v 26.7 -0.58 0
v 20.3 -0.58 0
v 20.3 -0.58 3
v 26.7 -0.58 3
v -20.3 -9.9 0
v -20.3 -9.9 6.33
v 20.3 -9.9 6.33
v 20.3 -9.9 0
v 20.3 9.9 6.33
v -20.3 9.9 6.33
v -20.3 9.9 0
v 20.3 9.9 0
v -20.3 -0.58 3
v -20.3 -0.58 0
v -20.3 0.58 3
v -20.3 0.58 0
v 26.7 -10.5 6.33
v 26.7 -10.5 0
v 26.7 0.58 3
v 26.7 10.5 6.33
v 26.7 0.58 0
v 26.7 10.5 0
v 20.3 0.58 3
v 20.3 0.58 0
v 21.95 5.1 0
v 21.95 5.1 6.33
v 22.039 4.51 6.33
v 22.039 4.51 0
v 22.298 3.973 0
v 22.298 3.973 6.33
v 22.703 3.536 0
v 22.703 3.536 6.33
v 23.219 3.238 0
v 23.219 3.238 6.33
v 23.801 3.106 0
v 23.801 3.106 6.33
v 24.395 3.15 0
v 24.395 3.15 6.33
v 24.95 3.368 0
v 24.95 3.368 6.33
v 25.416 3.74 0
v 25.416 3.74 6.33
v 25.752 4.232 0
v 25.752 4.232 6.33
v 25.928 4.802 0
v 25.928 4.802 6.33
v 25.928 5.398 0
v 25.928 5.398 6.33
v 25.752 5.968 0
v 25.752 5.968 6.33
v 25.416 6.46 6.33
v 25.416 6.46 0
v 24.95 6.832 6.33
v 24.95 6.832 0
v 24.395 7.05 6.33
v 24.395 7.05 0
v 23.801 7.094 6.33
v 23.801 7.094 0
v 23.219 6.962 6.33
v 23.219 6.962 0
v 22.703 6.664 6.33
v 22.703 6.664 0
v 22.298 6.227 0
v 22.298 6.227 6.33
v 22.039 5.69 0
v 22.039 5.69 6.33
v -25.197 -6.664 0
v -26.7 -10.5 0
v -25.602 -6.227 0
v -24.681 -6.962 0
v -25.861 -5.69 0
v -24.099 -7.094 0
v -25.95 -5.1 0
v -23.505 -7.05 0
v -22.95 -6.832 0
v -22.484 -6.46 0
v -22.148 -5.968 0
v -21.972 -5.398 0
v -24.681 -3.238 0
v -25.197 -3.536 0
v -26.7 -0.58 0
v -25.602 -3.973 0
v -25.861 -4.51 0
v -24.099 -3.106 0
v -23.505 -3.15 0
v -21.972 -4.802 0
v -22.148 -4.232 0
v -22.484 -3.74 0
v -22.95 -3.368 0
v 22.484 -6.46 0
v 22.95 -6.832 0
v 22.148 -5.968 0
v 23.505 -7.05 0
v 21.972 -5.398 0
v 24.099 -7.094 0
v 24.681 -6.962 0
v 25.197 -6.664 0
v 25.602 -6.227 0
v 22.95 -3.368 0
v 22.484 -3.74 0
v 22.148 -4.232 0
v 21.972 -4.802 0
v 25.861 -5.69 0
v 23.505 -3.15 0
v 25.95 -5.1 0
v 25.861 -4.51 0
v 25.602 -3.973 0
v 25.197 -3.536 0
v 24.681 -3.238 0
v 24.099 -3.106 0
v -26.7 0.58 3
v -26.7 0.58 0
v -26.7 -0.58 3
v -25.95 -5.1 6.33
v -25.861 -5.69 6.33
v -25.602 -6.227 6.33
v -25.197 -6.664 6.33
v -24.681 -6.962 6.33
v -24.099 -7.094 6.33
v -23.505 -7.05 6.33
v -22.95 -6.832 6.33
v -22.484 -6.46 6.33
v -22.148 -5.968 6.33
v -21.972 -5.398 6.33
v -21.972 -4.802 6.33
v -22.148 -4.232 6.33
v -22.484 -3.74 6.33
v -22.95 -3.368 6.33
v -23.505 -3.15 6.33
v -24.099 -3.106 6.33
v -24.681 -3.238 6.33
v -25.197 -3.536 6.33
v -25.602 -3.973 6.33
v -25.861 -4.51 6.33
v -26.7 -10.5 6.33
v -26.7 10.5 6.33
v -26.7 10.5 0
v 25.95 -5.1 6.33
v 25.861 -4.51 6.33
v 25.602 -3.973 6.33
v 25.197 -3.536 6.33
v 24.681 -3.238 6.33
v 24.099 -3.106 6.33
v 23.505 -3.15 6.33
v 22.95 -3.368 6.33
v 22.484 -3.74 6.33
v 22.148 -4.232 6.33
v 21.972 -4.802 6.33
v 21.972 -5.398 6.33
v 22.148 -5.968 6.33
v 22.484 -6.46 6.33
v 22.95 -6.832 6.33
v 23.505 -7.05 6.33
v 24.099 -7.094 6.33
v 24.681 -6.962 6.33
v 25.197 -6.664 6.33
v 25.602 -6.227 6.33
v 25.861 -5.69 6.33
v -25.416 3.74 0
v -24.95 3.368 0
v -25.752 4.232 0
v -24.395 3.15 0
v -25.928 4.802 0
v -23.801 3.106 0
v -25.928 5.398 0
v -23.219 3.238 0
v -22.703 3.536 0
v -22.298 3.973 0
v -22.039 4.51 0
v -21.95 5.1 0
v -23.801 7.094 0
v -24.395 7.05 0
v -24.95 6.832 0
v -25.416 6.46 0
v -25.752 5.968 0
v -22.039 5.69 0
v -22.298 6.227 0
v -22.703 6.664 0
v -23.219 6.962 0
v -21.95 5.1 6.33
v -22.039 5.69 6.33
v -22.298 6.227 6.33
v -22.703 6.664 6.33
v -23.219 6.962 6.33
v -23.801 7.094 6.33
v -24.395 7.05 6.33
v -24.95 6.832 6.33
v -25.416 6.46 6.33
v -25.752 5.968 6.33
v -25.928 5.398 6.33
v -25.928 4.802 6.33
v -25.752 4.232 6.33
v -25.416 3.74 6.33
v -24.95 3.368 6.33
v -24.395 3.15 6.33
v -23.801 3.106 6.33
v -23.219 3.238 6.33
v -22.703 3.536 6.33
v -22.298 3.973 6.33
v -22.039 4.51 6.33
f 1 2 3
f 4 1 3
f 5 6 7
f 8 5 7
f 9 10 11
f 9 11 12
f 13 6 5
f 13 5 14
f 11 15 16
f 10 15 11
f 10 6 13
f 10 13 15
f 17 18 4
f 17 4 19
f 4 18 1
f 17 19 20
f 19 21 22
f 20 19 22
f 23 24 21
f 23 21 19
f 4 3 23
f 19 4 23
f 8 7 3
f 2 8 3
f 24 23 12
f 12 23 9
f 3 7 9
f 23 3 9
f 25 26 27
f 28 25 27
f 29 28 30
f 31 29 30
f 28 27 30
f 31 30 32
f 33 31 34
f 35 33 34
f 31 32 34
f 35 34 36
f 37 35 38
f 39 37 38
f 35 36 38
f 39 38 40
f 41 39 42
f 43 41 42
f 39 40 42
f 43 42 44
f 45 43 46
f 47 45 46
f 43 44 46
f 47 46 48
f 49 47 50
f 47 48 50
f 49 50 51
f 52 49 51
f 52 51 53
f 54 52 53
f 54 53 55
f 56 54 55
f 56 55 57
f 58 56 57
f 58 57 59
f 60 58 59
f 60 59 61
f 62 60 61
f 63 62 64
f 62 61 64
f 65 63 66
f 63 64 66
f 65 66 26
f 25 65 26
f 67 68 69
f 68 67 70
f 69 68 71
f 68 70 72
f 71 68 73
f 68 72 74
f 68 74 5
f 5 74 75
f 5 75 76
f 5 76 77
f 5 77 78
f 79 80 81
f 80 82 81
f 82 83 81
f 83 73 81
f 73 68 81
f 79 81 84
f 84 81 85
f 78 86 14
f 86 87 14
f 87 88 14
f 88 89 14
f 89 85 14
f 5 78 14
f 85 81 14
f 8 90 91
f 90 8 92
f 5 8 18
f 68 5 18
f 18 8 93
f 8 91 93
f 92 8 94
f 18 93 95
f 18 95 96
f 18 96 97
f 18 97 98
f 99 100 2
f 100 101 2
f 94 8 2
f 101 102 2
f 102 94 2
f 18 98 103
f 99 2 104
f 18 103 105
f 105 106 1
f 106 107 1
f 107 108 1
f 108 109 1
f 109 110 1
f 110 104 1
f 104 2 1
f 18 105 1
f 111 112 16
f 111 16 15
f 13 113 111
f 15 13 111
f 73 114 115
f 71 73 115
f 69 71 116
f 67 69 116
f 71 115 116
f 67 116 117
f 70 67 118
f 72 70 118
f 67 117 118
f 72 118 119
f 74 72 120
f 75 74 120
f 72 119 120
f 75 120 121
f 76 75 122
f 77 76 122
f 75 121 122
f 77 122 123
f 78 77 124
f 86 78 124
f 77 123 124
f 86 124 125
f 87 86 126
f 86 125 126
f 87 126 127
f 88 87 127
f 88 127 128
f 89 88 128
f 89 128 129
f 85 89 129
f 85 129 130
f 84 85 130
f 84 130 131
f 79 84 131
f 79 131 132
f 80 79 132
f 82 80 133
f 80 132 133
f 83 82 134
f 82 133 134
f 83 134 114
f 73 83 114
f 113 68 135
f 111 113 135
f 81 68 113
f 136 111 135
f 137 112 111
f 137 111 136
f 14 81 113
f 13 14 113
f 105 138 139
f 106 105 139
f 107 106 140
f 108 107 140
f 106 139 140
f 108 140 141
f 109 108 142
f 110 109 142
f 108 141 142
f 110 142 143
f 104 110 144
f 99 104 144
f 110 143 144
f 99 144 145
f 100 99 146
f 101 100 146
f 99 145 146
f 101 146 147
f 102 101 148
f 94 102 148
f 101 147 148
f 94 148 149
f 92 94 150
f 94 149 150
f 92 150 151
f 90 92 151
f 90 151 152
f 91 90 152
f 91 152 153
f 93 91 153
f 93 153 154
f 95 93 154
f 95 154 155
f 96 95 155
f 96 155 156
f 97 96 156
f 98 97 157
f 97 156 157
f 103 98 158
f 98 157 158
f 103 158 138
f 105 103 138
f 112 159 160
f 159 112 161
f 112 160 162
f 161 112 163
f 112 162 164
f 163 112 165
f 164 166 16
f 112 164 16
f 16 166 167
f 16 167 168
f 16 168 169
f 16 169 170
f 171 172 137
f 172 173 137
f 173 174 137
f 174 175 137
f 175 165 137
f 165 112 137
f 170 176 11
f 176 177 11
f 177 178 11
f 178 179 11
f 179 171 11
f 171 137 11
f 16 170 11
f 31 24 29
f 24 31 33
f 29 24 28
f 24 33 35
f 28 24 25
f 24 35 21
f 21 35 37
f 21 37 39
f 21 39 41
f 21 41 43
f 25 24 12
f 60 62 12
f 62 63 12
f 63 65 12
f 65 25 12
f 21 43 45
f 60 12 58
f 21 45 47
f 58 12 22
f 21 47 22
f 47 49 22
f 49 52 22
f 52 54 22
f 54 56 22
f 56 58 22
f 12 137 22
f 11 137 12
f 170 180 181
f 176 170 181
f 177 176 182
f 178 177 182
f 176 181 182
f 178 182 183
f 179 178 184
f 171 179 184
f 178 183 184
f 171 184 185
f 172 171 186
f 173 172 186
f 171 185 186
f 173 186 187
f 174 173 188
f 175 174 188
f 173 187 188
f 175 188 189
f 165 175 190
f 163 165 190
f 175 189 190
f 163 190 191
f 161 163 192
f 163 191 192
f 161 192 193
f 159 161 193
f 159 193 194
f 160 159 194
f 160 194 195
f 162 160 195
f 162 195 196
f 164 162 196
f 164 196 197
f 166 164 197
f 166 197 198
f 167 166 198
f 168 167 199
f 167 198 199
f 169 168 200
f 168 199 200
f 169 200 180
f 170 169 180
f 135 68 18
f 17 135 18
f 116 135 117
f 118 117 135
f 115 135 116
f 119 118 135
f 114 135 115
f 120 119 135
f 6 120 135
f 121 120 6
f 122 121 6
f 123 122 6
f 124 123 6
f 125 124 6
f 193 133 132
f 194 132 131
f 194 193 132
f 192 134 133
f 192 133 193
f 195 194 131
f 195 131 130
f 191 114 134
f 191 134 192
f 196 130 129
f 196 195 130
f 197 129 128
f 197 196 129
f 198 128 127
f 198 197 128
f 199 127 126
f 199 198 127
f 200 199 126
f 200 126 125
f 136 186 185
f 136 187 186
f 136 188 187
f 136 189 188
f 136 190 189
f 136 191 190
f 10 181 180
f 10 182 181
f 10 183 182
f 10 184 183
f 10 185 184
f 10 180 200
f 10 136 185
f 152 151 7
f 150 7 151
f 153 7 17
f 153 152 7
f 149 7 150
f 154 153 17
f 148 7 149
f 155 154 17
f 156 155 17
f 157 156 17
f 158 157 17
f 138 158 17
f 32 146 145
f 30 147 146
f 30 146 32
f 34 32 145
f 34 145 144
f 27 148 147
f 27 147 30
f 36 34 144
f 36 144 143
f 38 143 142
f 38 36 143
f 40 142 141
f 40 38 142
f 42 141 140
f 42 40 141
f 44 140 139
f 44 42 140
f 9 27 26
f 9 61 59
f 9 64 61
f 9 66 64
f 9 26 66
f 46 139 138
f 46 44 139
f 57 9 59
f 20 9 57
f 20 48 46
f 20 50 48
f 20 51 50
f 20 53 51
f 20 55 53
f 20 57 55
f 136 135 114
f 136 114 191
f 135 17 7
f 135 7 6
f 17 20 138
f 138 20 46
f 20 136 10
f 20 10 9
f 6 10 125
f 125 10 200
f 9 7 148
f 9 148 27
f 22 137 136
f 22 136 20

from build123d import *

# Parameters (mm, degrees)
SKETCH1_W           = 53.4
SKETCH1_H           = 21
BOSS_EXTRUDE2_DEPTH = 6.33000004
SKETCH3_W           = 40.6
SKETCH3_H           = 19.8
CUT_EXTRUDE1_DEPTH  = 30.380416956
SKETCH4_W           = 3
SKETCH4_H           = 1.16
CUT_EXTRUDE2_DEPTH  = 55.789405002
SKETCH5_R           = 2
CUT_EXTRUDE3_DEPTH  = 6.33


with BuildPart() as part:
    # Sketch1 → Boss-Extrude2 (new body)
    with BuildSketch(Plane.XY):
        Rectangle(SKETCH1_W, SKETCH1_H)
    extrude(amount=BOSS_EXTRUDE2_DEPTH)

    # Sketch3 → Cut-Extrude1 (cut, through all)
    with BuildSketch(Plane.XY.offset(6.33000004)):
        Rectangle(SKETCH3_W, SKETCH3_H)
    extrude(amount=-CUT_EXTRUDE1_DEPTH, mode=Mode.SUBTRACT)

    # Sketch4 → Cut-Extrude2 (cut, through all)
    with BuildSketch(Plane.ZY.offset(26.7)):
        with Locations((1.5, 0)):
            Rectangle(SKETCH4_W, SKETCH4_H)
    extrude(amount=-CUT_EXTRUDE2_DEPTH, mode=Mode.SUBTRACT)

    # Sketch5 → Cut-Extrude3 (cut)
    with BuildSketch(Plane.XY.offset(6.33000004)):
        with Locations((-23.95, 5.1)):
            Circle(SKETCH5_R)
        with Locations(Location((-23.95, -5.1, 0), (0, 0, 180))):
            Circle(SKETCH5_R)
        with Locations((23.95, -5.1)):
            Circle(SKETCH5_R)
        with Locations(Location((23.95, 5.1, 0), (0, 0, 180))):
            Circle(SKETCH5_R)
    extrude(amount=-CUT_EXTRUDE3_DEPTH, mode=Mode.SUBTRACT)


solid = part.part
